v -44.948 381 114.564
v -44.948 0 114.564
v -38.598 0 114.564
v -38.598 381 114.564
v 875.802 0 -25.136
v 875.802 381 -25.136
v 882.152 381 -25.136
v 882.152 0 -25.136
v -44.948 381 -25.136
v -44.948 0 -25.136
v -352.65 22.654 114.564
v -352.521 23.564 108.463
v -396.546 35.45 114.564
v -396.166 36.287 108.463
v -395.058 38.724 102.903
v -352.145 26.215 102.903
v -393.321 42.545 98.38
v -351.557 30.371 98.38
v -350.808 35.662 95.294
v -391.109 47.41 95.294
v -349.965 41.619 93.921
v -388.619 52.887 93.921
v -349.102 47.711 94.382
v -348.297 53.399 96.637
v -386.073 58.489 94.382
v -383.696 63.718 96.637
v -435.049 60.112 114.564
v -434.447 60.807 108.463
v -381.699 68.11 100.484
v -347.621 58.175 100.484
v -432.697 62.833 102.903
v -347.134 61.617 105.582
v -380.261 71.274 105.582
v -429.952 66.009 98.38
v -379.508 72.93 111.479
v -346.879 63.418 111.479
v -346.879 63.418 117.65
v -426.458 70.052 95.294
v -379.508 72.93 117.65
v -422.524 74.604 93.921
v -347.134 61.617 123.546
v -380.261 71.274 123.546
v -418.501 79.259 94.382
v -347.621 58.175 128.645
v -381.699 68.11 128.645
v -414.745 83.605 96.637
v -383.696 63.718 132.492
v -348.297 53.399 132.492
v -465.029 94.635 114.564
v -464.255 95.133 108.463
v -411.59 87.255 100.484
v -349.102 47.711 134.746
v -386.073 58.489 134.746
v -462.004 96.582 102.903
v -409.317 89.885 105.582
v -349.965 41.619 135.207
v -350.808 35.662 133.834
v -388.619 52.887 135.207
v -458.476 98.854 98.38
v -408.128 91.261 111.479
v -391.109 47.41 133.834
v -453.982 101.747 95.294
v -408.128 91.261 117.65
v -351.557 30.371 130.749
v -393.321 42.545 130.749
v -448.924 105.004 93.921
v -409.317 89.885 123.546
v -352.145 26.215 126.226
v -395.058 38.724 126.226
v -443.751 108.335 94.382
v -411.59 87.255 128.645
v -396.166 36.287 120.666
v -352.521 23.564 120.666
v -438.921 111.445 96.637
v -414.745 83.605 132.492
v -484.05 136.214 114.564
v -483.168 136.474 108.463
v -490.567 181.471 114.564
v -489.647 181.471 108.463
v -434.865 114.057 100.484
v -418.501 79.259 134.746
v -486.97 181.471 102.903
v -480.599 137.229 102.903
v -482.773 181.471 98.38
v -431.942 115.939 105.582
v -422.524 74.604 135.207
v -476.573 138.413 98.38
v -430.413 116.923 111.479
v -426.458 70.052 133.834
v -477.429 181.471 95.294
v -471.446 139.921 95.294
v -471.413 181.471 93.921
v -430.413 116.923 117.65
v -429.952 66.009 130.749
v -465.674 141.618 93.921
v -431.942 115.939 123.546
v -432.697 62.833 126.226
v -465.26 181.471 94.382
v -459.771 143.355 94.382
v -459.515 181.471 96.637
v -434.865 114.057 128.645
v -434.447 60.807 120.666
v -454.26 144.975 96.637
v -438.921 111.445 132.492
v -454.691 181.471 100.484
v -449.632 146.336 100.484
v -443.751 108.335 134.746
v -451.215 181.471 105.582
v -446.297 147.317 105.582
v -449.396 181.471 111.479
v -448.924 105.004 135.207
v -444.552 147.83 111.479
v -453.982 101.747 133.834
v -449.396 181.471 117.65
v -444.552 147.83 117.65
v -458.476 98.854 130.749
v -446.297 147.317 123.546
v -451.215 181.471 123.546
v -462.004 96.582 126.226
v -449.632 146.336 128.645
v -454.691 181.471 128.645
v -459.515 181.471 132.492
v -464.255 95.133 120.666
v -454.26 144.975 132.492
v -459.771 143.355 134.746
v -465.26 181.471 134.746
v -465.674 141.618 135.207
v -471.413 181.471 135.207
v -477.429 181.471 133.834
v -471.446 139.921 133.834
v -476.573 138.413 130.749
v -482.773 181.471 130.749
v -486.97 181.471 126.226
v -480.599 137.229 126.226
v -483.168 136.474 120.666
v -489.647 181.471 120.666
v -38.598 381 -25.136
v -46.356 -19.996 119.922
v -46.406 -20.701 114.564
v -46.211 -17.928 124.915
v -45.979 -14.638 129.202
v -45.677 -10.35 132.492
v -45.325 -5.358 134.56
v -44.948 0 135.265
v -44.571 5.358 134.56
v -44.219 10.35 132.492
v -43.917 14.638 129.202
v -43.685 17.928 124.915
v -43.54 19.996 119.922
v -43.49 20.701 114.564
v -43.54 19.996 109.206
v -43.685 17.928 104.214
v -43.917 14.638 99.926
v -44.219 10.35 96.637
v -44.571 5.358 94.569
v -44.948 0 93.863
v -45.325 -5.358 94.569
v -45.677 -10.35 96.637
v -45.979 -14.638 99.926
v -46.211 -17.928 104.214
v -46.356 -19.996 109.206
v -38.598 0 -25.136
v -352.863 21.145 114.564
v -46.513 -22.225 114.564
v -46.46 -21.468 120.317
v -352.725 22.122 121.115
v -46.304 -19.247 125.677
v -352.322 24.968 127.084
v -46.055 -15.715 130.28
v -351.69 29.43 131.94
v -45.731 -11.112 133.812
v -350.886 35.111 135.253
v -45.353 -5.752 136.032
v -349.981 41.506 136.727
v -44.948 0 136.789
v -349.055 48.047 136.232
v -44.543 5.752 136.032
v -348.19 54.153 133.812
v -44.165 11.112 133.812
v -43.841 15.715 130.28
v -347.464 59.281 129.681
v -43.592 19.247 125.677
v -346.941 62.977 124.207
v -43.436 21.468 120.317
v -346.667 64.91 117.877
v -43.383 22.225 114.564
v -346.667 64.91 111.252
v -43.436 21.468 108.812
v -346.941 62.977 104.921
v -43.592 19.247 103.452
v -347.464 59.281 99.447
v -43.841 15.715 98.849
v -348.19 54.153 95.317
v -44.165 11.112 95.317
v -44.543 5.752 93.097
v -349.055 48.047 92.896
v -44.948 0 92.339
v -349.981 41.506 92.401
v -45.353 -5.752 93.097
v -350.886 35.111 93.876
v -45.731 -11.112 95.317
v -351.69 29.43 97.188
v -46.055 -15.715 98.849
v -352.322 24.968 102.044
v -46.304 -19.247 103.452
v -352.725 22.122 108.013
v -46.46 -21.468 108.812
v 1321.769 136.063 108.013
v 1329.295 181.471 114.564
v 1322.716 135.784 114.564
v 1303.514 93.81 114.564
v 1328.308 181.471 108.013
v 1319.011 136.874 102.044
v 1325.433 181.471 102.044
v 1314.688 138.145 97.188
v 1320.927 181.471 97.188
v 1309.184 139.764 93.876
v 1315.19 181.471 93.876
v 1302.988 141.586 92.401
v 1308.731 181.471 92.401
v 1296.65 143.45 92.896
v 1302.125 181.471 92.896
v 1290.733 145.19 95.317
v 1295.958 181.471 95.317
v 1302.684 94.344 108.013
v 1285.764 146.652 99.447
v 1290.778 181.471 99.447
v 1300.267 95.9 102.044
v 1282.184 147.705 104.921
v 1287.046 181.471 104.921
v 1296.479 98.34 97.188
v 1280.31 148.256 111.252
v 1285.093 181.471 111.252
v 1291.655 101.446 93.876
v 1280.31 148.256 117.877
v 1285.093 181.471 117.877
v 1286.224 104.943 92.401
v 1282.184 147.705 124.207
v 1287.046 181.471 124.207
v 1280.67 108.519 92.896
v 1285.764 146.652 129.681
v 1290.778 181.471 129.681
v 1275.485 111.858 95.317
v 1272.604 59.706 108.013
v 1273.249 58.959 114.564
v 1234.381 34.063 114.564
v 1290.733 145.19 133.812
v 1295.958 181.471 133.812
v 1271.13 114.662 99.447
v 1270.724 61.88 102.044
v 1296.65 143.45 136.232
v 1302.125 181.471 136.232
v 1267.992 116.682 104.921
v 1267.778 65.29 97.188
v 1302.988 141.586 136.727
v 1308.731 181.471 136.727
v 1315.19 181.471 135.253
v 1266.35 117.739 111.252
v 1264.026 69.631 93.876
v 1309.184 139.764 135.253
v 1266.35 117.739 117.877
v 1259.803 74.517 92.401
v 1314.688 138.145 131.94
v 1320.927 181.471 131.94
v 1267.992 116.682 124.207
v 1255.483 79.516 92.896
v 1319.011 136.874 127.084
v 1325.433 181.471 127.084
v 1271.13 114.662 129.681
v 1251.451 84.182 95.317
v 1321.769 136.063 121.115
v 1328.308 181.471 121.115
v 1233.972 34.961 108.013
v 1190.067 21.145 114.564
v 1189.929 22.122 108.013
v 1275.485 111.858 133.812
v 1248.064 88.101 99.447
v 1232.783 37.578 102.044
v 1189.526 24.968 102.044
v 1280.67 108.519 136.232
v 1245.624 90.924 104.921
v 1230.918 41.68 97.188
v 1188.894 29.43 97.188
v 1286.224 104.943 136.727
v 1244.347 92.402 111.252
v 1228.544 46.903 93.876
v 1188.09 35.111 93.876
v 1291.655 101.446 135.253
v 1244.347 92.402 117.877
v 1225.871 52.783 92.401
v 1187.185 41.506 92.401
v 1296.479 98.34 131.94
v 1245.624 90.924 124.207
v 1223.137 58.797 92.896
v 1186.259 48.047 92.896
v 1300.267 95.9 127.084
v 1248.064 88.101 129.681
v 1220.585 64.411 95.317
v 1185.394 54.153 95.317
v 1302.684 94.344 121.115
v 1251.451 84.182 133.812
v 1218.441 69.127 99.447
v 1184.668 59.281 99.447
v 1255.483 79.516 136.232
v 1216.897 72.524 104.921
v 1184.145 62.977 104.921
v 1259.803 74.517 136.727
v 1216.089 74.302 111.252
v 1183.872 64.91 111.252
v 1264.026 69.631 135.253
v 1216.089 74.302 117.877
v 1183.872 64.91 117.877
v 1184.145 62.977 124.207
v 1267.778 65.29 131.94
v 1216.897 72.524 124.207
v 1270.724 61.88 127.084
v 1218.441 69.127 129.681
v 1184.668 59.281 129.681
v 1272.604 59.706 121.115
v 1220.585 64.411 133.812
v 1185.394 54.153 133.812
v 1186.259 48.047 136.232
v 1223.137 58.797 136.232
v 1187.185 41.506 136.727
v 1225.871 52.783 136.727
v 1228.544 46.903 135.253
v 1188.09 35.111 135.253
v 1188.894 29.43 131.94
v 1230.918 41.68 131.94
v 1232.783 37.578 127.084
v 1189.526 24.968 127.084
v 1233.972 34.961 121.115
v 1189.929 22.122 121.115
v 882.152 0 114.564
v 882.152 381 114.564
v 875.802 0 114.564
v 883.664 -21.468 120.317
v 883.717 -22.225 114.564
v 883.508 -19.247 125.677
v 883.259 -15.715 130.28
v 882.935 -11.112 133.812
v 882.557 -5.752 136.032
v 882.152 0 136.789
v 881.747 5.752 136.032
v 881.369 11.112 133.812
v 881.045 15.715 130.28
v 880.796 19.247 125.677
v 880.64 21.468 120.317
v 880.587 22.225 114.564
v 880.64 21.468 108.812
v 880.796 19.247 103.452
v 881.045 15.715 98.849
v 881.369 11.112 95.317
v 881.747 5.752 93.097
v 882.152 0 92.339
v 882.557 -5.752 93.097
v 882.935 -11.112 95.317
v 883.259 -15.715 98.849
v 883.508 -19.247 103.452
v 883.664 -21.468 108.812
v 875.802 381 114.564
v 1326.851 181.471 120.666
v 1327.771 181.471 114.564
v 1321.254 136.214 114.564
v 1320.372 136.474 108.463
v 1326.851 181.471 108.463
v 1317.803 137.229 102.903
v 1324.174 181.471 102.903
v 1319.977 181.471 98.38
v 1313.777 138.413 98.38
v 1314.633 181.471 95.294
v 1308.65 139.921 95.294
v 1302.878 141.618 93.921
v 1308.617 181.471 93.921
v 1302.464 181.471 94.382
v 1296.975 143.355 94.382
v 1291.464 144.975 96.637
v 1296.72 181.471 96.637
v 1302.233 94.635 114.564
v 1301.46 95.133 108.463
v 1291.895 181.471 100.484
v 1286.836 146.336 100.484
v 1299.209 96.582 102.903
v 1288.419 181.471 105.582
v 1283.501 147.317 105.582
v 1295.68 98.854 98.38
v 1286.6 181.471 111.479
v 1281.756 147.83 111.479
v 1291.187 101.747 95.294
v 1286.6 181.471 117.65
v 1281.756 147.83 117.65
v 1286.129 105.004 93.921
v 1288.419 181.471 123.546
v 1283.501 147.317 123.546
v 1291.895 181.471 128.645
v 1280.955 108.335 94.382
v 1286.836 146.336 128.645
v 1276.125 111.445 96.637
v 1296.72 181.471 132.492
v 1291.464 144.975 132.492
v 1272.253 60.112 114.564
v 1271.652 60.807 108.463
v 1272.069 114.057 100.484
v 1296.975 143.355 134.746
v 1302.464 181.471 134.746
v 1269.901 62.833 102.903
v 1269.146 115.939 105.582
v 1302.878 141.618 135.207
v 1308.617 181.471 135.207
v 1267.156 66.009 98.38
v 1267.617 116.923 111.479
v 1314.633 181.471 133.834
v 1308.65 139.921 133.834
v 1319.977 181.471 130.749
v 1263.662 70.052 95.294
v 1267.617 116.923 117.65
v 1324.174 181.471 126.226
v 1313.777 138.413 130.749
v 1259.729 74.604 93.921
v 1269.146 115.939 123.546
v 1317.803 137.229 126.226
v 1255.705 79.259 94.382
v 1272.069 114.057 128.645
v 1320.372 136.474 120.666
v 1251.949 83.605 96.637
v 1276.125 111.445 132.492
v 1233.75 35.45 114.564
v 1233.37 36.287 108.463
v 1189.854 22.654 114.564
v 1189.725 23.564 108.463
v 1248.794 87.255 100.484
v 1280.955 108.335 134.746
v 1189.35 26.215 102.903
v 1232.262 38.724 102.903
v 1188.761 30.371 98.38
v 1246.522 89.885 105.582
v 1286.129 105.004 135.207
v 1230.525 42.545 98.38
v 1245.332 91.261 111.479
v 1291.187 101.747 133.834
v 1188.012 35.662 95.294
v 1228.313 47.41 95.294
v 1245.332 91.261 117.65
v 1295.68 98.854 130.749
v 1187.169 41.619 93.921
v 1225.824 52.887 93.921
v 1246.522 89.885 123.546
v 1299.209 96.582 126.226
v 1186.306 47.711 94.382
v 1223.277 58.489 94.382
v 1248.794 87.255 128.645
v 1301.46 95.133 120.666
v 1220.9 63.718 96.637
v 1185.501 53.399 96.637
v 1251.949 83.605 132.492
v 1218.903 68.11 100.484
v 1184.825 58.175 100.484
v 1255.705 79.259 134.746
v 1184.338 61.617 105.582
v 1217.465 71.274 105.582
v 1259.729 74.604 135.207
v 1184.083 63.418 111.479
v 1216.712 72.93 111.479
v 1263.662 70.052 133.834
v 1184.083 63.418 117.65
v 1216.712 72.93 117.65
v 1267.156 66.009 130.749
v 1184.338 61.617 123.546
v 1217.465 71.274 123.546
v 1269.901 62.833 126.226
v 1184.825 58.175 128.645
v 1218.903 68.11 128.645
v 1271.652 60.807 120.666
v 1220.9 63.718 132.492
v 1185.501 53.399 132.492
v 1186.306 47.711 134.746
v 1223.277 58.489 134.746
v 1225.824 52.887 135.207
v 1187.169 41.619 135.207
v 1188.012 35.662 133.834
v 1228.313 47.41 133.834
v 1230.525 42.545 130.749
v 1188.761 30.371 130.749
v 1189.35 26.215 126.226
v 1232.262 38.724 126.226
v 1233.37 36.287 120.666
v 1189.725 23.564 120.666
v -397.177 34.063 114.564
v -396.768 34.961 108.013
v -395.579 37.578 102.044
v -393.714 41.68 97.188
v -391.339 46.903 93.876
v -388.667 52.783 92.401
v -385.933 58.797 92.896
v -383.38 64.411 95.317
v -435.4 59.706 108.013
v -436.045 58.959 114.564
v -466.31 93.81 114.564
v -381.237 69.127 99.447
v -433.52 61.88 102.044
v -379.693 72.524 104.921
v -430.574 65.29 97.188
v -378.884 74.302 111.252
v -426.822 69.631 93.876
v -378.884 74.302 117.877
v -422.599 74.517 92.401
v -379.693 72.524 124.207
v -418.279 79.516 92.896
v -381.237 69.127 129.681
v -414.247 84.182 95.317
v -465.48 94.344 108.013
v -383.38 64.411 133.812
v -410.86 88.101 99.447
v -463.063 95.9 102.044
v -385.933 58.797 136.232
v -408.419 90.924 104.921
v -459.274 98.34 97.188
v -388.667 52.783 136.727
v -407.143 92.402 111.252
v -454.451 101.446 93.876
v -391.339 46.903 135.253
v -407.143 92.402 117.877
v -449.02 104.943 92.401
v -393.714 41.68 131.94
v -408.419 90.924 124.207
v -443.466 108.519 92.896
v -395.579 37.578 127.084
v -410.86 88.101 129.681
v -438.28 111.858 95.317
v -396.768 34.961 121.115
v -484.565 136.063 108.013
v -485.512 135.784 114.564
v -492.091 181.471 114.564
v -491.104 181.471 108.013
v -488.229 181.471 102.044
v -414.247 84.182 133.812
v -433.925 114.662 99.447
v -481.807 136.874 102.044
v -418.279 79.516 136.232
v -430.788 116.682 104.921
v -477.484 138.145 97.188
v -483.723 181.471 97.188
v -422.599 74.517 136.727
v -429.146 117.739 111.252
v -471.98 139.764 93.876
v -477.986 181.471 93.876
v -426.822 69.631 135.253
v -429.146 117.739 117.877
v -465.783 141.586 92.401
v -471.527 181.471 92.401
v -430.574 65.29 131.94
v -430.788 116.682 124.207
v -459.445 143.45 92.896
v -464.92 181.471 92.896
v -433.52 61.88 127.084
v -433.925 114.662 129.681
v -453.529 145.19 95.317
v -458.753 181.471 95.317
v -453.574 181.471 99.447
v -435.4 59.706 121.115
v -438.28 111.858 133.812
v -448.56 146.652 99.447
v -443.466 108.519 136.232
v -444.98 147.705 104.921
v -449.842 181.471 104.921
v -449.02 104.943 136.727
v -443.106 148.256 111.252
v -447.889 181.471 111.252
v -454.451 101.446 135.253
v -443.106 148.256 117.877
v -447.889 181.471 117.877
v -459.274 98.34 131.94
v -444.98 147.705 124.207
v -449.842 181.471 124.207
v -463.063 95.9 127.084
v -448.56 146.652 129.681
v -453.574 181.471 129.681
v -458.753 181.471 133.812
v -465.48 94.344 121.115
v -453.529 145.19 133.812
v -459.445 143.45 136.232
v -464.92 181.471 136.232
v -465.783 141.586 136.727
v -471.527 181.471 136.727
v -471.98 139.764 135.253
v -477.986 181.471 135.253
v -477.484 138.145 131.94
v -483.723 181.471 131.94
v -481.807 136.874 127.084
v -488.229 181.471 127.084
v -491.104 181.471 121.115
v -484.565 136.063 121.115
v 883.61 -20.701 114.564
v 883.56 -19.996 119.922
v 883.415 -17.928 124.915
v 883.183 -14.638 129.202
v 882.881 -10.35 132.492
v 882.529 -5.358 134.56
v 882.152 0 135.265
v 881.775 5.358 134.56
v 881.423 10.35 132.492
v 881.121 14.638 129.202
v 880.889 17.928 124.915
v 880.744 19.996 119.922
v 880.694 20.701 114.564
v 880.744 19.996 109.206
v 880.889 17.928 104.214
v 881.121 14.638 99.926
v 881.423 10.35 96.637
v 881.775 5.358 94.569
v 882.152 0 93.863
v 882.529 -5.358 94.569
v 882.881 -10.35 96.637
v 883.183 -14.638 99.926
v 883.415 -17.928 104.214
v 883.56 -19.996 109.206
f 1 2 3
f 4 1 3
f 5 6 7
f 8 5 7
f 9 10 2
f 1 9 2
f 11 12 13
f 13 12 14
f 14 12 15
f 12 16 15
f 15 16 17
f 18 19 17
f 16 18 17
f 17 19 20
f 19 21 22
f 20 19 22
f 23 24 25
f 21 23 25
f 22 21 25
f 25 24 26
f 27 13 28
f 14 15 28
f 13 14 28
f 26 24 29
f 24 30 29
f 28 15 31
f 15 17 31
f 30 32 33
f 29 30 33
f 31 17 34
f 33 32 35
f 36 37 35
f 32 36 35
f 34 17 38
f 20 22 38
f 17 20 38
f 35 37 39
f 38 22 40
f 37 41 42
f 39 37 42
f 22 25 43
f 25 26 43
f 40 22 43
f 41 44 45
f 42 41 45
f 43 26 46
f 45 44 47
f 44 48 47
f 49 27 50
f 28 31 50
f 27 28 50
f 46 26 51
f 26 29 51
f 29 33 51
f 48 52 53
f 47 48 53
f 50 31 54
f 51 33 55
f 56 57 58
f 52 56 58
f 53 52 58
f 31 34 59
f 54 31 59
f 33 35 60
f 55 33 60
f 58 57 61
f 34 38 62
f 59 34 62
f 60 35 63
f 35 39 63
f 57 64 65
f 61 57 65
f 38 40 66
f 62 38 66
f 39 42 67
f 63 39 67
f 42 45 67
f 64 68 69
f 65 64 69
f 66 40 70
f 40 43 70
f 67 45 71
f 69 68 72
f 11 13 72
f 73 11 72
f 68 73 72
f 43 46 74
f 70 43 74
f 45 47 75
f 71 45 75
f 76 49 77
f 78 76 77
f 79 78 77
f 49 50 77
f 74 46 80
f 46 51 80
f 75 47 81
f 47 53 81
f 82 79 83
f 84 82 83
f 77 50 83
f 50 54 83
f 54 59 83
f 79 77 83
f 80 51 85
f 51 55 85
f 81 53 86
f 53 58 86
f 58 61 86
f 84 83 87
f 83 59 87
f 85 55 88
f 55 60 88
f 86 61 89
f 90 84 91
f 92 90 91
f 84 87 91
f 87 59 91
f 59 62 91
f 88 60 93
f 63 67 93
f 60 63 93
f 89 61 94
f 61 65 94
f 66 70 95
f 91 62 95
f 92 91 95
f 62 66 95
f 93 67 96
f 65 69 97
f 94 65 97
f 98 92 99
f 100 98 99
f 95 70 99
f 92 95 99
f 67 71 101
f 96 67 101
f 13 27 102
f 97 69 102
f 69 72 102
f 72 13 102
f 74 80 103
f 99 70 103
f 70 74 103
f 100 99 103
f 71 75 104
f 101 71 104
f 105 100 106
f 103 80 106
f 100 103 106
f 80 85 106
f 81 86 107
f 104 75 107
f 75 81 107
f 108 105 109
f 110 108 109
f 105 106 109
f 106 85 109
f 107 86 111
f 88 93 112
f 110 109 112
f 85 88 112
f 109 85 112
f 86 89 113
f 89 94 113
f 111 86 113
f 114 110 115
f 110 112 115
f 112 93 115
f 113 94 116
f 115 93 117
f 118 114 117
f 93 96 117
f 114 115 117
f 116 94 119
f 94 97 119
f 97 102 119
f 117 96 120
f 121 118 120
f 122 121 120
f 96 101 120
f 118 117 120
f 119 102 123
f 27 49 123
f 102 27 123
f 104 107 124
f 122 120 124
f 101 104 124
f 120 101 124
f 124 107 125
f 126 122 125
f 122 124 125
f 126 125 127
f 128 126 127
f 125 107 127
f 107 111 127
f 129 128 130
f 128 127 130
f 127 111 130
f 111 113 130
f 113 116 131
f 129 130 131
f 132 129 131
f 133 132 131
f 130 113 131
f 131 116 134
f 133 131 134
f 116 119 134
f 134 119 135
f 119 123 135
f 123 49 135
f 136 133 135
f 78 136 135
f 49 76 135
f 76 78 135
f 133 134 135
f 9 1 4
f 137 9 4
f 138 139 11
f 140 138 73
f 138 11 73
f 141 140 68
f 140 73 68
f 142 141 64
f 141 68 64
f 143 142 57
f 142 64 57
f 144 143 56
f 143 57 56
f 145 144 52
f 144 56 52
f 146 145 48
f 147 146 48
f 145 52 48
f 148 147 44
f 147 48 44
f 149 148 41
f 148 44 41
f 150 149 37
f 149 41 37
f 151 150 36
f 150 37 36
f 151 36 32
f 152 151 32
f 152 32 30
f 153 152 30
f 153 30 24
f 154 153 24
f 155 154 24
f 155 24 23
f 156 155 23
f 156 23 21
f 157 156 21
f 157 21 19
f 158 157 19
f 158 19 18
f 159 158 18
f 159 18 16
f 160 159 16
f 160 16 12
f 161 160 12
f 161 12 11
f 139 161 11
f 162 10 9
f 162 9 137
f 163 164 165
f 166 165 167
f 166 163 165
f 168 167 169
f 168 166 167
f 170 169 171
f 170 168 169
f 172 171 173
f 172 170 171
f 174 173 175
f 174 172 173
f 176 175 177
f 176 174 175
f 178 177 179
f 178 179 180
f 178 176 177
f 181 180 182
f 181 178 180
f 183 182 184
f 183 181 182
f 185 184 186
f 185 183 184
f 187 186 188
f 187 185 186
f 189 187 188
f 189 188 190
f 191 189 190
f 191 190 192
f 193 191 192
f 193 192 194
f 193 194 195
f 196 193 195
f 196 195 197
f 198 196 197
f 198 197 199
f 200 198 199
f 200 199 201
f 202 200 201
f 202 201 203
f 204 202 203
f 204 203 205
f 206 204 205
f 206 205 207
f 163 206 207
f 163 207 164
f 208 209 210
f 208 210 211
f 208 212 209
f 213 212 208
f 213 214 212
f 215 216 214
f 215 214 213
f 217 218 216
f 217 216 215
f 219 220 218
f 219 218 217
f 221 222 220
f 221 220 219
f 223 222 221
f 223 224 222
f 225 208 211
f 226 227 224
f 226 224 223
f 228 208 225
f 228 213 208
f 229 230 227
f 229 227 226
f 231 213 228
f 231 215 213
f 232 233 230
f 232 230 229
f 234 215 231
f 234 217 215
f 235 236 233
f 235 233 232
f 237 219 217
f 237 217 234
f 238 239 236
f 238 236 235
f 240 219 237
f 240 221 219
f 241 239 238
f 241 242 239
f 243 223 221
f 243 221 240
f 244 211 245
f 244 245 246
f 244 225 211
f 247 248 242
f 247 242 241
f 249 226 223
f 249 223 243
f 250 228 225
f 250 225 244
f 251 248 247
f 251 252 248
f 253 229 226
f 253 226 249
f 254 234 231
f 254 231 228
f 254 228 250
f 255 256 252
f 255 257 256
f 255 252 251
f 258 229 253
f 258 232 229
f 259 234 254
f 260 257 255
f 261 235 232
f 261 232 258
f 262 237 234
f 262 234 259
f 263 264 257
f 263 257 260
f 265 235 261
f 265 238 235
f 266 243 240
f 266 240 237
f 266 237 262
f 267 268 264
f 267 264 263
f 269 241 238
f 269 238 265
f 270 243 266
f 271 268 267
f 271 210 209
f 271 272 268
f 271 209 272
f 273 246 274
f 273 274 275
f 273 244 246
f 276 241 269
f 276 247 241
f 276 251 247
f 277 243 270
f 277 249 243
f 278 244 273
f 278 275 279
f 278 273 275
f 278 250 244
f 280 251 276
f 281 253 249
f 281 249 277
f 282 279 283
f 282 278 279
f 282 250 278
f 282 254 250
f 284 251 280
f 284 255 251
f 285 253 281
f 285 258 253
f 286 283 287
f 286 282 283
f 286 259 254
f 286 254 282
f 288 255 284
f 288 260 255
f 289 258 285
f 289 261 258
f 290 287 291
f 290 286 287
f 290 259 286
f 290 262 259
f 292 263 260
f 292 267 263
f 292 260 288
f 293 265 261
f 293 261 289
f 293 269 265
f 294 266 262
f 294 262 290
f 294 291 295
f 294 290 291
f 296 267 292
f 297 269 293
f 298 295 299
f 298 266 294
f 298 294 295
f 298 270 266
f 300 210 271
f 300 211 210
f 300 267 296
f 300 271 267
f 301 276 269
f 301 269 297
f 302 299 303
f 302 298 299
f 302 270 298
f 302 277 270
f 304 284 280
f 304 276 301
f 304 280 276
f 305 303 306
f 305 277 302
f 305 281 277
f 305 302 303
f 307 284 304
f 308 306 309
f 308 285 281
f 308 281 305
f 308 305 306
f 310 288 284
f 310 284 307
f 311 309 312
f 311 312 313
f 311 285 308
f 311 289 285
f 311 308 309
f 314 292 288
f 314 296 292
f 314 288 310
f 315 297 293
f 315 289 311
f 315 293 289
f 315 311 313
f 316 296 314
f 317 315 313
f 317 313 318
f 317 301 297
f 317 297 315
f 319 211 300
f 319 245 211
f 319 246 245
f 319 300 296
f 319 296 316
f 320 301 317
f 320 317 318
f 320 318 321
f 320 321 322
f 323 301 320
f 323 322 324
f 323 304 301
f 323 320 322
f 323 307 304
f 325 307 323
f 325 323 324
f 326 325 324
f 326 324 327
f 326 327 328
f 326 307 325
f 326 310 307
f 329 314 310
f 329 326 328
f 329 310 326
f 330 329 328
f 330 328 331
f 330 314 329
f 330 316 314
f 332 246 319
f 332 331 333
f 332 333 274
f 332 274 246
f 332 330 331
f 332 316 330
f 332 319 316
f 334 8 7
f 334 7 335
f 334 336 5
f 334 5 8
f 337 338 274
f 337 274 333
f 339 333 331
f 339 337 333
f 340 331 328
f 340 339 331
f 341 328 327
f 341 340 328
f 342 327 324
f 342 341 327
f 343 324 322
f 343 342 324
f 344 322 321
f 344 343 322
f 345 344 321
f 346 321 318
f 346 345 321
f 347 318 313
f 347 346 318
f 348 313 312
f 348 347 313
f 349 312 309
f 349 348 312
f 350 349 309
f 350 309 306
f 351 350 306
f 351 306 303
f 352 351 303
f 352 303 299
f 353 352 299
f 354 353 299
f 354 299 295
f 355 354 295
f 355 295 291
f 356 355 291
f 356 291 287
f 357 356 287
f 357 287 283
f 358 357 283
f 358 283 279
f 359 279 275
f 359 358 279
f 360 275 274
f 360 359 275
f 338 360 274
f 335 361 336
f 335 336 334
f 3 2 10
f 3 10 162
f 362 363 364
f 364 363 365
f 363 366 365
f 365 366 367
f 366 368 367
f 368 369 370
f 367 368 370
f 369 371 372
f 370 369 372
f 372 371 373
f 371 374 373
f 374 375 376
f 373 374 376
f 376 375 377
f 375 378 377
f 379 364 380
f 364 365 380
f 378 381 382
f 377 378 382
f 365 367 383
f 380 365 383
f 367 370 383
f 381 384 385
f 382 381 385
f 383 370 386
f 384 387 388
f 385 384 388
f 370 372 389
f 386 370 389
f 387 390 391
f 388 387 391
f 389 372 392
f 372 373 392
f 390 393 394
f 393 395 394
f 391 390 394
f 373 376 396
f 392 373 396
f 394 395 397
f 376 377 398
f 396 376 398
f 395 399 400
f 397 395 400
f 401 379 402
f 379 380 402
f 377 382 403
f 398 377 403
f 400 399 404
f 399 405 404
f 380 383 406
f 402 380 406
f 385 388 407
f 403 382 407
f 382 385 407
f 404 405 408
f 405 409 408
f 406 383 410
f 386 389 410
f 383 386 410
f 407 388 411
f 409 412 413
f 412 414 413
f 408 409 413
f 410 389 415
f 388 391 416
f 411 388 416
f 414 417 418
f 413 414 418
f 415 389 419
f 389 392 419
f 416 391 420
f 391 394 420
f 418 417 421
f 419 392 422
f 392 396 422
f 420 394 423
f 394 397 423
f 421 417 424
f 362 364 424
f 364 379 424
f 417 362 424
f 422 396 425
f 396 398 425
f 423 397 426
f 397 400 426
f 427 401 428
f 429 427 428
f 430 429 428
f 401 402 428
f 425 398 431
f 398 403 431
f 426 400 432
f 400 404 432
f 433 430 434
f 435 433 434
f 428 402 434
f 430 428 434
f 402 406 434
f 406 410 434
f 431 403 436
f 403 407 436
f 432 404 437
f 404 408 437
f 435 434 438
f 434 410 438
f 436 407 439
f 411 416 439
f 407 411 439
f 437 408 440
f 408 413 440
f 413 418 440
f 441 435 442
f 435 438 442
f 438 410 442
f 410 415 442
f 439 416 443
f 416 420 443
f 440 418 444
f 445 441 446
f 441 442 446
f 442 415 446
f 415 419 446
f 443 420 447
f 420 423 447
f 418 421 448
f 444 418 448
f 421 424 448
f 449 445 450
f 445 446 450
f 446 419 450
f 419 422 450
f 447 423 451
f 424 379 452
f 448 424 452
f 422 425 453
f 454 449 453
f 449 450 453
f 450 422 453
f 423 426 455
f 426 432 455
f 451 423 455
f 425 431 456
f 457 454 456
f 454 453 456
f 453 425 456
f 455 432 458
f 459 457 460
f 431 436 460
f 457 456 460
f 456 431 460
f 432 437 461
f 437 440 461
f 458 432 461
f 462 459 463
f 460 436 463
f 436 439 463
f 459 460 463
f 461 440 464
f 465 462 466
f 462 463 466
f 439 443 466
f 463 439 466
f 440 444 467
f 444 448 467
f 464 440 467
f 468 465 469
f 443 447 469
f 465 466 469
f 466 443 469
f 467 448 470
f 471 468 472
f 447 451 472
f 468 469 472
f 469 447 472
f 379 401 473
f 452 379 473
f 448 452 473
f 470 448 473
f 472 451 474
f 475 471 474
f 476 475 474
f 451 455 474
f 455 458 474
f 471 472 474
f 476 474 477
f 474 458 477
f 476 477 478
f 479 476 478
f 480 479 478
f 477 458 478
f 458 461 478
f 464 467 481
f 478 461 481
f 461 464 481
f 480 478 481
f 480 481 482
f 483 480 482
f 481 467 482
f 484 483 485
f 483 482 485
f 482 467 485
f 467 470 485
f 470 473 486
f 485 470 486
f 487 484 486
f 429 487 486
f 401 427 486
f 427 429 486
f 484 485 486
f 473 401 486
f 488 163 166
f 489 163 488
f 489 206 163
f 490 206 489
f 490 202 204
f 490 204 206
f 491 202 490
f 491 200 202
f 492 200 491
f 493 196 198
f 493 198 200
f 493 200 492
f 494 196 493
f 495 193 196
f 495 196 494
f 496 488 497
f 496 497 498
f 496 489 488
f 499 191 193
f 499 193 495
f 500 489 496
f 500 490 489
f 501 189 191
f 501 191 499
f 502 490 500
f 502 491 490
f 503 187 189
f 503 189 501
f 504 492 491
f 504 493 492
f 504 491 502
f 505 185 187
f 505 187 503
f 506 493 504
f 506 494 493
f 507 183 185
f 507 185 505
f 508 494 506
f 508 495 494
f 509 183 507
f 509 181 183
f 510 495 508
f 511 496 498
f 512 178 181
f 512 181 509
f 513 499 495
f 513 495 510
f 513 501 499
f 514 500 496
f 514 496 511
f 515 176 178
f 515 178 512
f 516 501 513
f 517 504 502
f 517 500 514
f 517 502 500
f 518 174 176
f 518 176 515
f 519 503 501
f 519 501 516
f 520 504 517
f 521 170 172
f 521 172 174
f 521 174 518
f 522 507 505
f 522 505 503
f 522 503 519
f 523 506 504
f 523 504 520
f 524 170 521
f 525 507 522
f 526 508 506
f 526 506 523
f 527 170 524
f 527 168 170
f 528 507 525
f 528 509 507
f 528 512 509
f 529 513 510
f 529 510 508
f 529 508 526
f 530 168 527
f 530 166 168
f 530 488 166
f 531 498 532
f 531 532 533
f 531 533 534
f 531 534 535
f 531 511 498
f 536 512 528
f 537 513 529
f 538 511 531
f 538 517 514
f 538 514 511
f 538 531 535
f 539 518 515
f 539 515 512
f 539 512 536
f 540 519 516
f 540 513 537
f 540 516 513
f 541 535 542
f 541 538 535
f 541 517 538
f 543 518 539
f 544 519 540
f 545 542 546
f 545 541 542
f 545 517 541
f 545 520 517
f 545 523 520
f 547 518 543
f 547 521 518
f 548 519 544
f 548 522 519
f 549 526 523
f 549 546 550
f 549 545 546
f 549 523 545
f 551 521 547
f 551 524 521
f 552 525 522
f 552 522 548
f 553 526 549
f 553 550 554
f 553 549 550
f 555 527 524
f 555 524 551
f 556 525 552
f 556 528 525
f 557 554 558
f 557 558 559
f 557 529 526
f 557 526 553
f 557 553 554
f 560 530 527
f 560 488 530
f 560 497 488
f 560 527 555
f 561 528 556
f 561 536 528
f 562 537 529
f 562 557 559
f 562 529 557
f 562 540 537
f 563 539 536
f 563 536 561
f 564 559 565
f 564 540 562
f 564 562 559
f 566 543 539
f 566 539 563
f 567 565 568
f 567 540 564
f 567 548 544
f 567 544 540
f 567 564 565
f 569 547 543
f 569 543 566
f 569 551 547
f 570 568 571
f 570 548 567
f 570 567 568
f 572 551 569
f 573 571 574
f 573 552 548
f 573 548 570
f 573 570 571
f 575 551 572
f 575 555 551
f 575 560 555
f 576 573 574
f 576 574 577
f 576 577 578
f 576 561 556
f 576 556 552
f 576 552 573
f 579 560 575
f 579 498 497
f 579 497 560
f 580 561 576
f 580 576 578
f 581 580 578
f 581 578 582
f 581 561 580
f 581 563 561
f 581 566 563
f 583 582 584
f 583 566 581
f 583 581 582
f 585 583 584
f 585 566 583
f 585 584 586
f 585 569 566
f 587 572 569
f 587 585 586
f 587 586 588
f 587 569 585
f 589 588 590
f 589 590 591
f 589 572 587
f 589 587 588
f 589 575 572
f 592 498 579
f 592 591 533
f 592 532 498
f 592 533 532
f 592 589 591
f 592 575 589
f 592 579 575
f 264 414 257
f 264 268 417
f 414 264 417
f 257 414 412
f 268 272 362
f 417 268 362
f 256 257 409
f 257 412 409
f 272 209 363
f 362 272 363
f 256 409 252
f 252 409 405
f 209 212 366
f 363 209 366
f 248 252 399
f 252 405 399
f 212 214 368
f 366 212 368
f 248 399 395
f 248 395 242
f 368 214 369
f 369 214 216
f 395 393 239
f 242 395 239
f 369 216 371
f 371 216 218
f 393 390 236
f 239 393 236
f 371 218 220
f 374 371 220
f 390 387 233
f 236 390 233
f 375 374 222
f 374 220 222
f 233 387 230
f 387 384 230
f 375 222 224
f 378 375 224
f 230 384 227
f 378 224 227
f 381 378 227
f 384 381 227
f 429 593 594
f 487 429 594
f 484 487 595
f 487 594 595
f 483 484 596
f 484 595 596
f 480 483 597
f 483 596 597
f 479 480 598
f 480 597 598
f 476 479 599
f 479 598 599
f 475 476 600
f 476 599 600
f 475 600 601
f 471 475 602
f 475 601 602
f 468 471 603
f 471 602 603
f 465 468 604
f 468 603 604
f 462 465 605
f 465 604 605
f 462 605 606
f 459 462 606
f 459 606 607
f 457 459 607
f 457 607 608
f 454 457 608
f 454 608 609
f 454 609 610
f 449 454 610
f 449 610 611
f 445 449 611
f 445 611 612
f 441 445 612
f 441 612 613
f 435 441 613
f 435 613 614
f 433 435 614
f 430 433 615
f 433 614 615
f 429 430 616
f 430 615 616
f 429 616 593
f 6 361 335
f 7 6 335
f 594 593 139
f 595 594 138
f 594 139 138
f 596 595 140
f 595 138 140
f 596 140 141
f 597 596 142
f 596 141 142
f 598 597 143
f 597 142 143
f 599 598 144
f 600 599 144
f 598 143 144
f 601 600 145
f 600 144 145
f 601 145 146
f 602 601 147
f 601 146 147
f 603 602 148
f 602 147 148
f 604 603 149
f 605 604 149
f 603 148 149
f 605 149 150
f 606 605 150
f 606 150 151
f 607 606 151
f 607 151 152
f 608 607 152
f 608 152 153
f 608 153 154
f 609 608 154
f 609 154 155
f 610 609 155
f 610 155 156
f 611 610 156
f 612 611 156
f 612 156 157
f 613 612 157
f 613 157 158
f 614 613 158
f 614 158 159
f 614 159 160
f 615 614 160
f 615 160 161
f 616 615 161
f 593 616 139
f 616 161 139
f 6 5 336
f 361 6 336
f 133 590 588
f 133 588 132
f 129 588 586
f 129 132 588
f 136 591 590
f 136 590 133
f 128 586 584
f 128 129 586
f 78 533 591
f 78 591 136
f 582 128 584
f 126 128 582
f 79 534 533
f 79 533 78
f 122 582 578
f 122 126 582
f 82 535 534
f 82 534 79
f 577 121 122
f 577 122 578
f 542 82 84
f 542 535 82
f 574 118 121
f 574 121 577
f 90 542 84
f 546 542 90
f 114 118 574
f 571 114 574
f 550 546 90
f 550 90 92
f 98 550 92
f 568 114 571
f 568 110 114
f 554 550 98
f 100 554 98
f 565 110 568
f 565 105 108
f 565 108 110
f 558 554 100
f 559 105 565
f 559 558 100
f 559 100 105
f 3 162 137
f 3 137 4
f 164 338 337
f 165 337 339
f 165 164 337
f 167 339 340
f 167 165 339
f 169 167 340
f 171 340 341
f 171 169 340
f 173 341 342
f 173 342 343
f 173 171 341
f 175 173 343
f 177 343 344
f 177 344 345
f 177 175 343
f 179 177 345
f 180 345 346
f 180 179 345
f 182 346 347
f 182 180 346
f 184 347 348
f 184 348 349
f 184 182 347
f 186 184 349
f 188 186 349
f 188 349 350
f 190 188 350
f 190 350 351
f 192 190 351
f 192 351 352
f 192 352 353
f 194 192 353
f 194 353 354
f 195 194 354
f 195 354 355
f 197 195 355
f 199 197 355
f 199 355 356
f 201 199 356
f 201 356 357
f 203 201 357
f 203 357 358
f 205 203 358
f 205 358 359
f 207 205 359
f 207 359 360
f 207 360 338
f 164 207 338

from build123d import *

# Parameters (mm, degrees)
F0_W     = 6.35
F0_H     = 139.7
F1_DEPTH = 381
F5_R     = 22.225
F5_R_2   = 20.701


with BuildPart() as f1:
    # F0 (on Front) → F1 (new body)
    with BuildSketch(Plane.XZ):
        with Locations((-41.7729020119, 44.714268426)):
            Rectangle(F0_W, F0_H)
    extrude(amount=-F1_DEPTH)


with BuildPart() as f1b:
    # F0 (on Front) → F1, piece 2 (new body)
    with BuildSketch(Plane.XZ):
        with Locations((878.9770979881, 44.714268426)):
            Rectangle(F0_W, F0_H)
    extrude(amount=-F1_DEPTH)


with BuildPart() as f6:
    # F6: sweep along a path in F3
    with BuildLine(Plane(origin=(0, 0, 114.564268426), x_dir=(1, 0, 0), z_dir=(0, 0, -1))) as f6_path:
        ThreePointArc((1307.0701669502, -181.4710030579), (1272.8492780718, -89.8727109504), (1186.9520979881, -43.1502237916))
        Line((1186.9520979881, -43.1502237916), (882.1520979881, 0))
        Line((882.1520979881, 0), (-44.9479020119, 0))
        Line((-44.9479020119, 0), (-349.7479020119, -43.1502237916))
        ThreePointArc((-349.7479020119, -43.1502237916), (-435.6450820955, -89.8727109504), (-469.8659709739, -181.4710030579))
    # F5 (on line) → F6 (sweep)
    with BuildSketch(Plane.XZ.offset(-181.4710030579)):
        with Locations((1307.0701669502, 114.564268426)):
            Circle(F5_R)
        with Locations((1307.0701669502, 114.564268426)):
            Circle(F5_R_2, mode=Mode.SUBTRACT)
    sweep(path=f6_path.line, transition=Transition.RIGHT)


solid = Compound([f1.part, f1b.part, f6.part])
